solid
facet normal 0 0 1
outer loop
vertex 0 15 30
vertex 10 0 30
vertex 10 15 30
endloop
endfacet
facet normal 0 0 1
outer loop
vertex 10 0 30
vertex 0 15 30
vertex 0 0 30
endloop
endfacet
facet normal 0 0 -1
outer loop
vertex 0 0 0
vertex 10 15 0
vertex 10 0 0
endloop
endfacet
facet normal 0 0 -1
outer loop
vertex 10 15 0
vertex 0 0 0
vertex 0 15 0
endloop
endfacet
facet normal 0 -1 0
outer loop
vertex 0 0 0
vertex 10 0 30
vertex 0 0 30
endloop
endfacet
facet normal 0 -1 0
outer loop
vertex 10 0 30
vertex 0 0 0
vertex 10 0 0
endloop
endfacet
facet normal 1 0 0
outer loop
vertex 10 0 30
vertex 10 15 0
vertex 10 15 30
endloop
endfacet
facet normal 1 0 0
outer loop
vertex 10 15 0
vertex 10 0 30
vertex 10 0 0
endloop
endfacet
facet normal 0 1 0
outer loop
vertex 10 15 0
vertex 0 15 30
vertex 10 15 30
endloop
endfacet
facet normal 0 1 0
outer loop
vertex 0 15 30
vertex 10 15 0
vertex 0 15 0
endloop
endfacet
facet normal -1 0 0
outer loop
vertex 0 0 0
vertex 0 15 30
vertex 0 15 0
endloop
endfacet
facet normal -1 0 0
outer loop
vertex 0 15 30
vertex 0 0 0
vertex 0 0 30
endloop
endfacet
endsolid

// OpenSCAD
// Generated by generate_scads.py
cube(size=[10,15,30], center=false);
